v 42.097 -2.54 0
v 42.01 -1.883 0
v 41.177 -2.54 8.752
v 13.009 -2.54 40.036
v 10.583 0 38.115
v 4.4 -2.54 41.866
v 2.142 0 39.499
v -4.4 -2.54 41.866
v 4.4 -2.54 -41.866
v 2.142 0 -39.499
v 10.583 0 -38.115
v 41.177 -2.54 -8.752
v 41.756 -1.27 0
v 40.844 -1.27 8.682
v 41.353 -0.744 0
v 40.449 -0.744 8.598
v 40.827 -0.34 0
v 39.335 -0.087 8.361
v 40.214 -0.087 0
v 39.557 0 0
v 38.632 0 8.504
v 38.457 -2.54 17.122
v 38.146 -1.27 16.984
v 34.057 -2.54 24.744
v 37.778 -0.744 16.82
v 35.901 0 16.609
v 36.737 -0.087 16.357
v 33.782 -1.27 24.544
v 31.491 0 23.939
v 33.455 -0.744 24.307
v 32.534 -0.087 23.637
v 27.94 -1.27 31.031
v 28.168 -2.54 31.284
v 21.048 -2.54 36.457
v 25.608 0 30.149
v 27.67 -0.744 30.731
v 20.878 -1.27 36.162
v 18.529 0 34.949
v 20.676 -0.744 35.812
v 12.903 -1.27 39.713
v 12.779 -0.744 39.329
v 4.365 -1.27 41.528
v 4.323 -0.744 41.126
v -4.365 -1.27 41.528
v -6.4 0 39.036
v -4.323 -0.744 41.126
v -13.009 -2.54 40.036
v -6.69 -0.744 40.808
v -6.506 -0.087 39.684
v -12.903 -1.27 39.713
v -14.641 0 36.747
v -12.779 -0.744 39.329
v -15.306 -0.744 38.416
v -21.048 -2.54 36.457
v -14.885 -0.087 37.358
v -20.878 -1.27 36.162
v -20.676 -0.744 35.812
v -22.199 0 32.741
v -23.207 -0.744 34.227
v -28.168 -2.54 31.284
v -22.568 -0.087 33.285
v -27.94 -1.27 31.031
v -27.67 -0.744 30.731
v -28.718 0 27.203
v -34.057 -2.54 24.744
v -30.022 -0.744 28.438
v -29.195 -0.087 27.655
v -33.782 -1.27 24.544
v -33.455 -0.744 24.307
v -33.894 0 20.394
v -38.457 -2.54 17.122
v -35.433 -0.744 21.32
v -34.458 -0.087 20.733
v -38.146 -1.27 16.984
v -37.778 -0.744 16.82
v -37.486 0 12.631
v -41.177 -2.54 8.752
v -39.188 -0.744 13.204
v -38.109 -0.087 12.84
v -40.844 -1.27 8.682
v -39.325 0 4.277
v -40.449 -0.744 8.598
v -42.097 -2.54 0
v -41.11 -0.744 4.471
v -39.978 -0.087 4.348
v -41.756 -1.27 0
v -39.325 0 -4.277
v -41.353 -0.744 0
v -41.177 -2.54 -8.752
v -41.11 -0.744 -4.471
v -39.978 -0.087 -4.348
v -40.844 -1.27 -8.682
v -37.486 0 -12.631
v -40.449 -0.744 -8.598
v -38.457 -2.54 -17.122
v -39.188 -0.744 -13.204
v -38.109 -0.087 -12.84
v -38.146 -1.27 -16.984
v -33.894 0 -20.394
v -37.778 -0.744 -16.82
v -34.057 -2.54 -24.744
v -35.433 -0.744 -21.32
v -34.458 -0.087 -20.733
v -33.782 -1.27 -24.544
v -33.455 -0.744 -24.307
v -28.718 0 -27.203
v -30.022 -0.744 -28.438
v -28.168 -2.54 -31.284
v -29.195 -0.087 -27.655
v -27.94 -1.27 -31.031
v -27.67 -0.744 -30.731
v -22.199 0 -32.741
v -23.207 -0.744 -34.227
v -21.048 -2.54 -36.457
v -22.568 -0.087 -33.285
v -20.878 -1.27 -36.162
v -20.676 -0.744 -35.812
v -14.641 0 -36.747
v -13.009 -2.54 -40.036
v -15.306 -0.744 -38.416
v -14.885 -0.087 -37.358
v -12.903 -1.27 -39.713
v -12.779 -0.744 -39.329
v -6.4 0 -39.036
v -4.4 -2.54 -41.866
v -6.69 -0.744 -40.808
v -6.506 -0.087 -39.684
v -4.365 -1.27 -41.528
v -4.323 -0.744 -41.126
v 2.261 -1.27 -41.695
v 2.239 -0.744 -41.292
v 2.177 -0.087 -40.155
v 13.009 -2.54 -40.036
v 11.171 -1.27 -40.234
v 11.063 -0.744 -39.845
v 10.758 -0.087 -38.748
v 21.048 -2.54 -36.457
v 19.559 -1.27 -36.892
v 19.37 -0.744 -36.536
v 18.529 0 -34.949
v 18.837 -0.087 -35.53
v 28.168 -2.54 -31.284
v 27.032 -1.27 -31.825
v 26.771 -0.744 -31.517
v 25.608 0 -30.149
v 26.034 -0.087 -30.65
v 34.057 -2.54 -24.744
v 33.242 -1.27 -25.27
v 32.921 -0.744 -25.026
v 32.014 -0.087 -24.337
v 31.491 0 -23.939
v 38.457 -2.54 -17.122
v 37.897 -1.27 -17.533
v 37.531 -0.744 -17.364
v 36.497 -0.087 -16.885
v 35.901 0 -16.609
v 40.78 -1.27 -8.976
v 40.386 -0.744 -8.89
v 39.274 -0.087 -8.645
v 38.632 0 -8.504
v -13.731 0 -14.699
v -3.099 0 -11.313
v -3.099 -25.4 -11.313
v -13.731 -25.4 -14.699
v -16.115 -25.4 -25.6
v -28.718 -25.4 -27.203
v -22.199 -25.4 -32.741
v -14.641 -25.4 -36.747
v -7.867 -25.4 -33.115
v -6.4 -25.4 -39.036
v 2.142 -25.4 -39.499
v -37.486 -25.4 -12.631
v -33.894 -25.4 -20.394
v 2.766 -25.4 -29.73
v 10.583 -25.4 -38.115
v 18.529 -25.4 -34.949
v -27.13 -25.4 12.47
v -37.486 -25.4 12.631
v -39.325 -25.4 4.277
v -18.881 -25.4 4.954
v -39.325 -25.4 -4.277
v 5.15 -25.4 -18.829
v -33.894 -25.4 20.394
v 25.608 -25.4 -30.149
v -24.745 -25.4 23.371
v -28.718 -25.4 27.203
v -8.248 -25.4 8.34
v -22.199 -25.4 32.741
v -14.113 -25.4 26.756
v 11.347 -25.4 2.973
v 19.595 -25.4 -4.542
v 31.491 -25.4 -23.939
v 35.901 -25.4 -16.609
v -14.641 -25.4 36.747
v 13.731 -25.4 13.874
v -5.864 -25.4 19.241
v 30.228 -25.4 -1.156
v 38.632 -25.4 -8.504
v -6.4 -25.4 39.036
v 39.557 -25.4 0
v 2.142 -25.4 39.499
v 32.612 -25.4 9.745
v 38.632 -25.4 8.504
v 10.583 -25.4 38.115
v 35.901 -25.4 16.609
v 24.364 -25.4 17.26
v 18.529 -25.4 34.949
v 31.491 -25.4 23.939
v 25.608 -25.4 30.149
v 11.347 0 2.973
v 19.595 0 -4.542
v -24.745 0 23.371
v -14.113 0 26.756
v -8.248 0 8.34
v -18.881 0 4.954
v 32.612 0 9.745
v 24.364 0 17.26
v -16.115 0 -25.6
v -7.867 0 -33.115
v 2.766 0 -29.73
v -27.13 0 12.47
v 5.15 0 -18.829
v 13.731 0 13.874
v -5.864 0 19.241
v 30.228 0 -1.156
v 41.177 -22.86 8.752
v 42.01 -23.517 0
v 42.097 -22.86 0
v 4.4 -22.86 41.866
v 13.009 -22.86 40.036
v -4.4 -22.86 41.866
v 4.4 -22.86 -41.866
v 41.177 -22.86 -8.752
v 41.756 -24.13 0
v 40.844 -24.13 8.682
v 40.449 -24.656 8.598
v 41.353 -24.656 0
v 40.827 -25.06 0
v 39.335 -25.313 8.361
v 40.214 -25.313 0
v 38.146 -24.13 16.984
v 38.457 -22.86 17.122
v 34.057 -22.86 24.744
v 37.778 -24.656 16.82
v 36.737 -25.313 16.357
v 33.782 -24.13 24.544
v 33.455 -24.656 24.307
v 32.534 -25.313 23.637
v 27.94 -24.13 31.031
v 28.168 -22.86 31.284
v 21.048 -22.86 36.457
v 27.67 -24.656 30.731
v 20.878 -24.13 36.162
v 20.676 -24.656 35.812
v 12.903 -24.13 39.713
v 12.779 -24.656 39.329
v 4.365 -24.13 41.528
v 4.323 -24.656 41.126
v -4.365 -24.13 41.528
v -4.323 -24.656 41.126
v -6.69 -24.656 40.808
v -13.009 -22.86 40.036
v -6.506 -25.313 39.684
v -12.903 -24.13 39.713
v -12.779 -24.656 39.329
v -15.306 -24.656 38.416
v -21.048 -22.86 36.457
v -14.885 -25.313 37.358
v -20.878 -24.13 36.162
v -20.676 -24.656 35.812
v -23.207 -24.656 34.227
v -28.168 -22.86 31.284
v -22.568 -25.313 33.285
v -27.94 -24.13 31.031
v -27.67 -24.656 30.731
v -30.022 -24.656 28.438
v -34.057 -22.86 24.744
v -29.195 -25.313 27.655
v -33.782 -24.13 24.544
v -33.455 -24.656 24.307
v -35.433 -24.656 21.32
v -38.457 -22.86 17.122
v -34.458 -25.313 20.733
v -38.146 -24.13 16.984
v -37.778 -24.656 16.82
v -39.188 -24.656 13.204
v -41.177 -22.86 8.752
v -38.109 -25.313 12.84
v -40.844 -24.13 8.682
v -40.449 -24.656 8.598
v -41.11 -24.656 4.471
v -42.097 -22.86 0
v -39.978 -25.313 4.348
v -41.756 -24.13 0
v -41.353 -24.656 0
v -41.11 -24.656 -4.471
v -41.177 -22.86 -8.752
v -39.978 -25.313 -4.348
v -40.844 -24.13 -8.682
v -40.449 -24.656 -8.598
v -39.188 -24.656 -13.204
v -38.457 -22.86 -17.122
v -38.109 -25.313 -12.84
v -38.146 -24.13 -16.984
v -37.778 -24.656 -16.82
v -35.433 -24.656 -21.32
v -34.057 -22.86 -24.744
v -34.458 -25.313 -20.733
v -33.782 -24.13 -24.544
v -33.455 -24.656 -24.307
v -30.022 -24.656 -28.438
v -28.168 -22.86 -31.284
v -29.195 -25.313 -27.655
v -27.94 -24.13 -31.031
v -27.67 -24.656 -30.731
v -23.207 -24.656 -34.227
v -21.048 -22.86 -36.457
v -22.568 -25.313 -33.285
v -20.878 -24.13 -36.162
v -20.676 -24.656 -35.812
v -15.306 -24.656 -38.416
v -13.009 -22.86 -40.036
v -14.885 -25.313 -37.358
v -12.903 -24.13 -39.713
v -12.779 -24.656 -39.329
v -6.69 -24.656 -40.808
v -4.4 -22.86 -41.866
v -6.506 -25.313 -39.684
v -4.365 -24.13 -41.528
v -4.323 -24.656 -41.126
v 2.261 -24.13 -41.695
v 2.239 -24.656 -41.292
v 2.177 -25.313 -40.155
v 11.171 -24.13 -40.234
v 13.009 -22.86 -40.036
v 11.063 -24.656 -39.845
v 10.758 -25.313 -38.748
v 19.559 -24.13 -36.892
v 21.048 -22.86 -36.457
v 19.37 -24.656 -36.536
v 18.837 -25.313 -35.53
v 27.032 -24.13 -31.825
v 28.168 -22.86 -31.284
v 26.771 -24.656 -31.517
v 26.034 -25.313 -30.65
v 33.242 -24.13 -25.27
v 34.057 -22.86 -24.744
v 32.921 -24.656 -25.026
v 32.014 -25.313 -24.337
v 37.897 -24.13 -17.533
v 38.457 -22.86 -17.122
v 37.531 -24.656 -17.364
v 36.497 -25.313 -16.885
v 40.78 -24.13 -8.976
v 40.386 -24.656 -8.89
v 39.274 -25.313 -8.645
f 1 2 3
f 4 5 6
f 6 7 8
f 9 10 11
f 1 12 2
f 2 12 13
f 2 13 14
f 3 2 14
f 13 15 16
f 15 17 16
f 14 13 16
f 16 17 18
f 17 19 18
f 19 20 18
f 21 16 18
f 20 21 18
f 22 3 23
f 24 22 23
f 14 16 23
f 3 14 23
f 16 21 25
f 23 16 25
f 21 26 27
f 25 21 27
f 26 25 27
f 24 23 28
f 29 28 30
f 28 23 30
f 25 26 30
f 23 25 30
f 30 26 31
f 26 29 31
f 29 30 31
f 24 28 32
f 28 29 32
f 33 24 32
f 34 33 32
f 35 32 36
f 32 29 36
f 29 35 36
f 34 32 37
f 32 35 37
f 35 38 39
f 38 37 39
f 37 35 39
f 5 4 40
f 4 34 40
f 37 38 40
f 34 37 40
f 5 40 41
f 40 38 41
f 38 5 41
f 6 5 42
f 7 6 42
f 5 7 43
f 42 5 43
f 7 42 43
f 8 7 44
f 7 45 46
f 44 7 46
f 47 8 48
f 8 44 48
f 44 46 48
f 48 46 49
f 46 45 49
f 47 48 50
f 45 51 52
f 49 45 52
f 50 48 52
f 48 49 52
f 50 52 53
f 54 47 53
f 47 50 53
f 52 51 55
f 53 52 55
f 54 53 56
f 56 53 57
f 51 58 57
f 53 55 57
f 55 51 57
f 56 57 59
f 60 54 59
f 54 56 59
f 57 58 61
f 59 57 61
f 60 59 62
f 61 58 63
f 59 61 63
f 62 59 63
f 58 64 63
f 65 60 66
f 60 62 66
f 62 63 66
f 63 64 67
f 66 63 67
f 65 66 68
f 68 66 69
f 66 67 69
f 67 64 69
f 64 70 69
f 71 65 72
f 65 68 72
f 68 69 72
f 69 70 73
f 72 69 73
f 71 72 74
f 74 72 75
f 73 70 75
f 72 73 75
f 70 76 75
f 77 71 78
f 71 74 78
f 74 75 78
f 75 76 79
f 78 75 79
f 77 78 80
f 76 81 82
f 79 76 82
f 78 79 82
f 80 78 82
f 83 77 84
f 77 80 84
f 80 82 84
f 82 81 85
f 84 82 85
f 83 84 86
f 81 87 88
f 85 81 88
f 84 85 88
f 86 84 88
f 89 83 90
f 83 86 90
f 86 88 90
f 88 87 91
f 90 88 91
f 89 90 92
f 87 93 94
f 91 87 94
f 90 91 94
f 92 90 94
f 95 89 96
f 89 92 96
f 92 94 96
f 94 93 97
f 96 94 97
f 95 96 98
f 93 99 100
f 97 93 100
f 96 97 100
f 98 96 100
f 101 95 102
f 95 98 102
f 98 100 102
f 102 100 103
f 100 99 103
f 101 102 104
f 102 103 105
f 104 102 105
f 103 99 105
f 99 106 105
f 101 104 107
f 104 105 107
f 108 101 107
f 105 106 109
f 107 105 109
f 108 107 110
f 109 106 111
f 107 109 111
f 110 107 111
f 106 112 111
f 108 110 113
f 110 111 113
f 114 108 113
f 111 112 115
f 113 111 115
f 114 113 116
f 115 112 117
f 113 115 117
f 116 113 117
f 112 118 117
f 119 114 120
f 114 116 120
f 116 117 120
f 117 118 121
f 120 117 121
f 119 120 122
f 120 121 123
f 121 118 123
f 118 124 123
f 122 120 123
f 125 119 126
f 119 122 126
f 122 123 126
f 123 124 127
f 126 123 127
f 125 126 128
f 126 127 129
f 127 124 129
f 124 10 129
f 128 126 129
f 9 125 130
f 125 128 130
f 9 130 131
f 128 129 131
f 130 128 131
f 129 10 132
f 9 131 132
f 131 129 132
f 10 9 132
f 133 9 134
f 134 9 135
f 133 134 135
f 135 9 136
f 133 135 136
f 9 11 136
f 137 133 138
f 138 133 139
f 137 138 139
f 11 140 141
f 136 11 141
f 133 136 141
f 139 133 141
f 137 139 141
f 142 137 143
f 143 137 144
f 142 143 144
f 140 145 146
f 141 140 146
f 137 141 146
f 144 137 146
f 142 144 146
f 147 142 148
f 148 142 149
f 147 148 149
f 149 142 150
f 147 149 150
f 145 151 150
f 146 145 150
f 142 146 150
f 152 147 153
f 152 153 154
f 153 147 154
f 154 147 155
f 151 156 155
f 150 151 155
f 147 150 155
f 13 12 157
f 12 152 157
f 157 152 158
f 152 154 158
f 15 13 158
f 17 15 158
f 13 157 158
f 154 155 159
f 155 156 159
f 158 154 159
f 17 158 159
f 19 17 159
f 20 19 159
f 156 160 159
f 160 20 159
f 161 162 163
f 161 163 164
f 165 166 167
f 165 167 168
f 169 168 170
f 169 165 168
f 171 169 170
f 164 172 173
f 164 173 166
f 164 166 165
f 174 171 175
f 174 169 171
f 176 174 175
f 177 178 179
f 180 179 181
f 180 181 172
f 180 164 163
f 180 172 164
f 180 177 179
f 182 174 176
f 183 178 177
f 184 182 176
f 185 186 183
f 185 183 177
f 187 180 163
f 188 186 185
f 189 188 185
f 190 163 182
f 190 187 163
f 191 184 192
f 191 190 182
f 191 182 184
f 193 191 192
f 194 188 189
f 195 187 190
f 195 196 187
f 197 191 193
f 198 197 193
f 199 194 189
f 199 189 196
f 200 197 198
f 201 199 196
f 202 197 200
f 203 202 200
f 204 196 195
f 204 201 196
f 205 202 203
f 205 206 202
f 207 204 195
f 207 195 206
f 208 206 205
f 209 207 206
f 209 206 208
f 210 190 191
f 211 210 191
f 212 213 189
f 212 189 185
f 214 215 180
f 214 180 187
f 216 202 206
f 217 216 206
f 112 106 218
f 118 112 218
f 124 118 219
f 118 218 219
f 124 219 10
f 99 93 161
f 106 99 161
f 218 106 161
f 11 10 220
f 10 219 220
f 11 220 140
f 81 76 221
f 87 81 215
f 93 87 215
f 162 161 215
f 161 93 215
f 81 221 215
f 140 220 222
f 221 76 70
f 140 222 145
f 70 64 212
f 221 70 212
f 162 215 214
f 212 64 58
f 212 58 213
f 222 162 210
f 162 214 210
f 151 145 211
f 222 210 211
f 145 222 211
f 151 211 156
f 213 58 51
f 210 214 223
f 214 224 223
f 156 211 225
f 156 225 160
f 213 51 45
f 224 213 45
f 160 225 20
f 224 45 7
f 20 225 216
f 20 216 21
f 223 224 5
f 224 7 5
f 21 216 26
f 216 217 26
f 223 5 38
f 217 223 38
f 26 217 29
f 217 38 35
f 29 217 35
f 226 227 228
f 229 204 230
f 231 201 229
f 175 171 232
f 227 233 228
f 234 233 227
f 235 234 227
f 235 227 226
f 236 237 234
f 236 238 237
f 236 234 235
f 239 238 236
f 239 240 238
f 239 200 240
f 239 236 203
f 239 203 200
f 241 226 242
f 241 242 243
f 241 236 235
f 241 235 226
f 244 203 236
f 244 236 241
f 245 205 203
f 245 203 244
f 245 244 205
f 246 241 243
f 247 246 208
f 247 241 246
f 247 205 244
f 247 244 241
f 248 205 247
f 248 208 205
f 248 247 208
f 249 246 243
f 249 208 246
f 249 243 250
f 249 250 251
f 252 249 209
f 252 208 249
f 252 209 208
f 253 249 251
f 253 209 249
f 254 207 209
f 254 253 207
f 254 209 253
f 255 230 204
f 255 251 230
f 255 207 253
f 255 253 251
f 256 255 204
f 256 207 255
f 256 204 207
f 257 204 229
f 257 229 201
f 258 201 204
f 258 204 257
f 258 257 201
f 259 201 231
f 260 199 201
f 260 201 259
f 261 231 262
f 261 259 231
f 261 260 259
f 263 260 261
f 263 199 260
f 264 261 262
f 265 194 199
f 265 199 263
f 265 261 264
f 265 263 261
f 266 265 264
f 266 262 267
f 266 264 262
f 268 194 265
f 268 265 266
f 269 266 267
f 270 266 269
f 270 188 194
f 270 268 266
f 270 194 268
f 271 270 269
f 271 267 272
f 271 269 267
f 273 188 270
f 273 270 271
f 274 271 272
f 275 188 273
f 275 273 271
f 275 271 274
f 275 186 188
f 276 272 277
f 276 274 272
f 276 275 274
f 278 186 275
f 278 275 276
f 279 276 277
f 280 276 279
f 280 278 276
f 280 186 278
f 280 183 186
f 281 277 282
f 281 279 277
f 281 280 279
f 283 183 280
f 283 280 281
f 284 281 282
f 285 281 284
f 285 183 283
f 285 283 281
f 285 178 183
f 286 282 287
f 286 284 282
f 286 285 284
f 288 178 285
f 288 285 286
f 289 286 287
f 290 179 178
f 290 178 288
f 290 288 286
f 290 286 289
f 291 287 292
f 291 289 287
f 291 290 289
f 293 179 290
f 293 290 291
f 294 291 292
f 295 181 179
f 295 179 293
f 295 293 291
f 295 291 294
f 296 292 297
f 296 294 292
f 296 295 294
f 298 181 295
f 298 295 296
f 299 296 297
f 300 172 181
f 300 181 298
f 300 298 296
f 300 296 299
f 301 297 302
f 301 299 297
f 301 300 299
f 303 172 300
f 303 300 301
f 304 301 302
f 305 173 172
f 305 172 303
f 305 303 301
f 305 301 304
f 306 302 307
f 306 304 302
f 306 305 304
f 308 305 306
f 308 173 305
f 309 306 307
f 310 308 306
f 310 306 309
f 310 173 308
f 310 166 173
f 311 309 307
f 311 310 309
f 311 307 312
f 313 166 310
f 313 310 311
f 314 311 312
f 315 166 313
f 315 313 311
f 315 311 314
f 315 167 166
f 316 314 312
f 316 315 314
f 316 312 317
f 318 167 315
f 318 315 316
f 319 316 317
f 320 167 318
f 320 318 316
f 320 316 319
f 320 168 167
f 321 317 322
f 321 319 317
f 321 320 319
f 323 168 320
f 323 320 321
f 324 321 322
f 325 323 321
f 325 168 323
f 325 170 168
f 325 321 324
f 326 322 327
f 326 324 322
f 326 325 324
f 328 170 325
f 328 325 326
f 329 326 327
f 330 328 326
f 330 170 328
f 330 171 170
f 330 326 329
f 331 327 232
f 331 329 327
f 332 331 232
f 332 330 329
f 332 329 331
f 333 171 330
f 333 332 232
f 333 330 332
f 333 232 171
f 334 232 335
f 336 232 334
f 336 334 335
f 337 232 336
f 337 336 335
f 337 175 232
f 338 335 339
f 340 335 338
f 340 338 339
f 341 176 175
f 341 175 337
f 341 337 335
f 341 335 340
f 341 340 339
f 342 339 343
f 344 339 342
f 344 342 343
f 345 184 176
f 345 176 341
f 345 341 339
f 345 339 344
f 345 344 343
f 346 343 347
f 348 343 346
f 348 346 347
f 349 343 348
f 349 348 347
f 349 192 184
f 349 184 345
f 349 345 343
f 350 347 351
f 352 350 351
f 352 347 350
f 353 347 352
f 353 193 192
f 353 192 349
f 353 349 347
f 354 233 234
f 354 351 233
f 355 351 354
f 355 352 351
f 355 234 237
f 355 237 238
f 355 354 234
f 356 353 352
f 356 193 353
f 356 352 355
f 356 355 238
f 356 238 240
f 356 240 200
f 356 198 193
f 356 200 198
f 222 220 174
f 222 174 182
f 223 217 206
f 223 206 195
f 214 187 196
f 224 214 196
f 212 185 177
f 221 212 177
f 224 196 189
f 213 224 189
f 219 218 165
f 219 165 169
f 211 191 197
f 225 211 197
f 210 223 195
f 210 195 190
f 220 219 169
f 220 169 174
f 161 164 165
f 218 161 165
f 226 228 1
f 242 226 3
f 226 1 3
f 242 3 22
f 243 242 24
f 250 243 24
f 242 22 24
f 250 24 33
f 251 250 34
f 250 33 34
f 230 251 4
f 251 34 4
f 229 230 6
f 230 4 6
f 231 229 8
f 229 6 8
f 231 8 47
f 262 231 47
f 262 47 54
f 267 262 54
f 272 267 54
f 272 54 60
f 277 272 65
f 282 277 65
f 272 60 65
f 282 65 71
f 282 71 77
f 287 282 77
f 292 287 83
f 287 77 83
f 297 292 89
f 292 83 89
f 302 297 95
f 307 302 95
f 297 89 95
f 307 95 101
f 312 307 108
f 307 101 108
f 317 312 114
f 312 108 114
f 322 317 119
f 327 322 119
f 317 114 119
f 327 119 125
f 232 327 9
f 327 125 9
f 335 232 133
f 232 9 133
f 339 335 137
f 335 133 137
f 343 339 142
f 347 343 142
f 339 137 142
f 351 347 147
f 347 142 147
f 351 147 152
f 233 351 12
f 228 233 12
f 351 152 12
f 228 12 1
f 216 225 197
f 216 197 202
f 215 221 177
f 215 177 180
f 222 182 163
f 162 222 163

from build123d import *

# Parameters (mm, degrees)
F0_R            = 42.0966561171
F1_DEPTH        = 25.4
F3_DEPTH        = 25.401
F3_COPIES_COUNT = 3
F4_R            = 2.54
F5_R            = 2.54


# Not quite as in the source:
# - a pattern or mirror of a feature is missing from the dataset's text; its kind, count and spacing are read off the source's solid


with BuildPart() as f1:
    # F0 (on Front) → F1 (new body)
    with BuildSketch(Plane.XZ):
        Circle(F0_R)
    extrude(amount=F1_DEPTH)

    # F2 (on face) → F3 (cut, through all)
    with BuildSketch(Plane.XZ.offset(25.4)):
        Polygon((-18.881084953, 4.9543602206), (-8.2484530285, 8.3401026204), (-5.8642759952, 19.241103176), (-14.1127308863, 26.7563613318), (-24.7453628108, 23.3706189319), (-27.1295398441, 12.4696183764), align=None)
    f3 = extrude(amount=-F3_DEPTH, mode=Mode.SUBTRACT)

    # F3_copies: F3 ×3 about axis
    f3_copies_axis = Axis((0, 0, 0), (0, 1, 0))
    for i in range(1, F3_COPIES_COUNT):
        add(f3.rotate(f3_copies_axis, i * 360 / F3_COPIES_COUNT), mode=Mode.SUBTRACT)

    # F4
    f4_edges = [f1.edges().sort_by_distance(p)[0] for p in [
        (-42.096656, -25.4, 0),
    ]]
    fillet(f4_edges, radius=F4_R)

    # F5
    f5_edges = [f1.edges().sort_by_distance(p)[0] for p in [
        (-42.096656, 0, 0),
    ]]
    fillet(f5_edges, radius=F5_R)


solid = f1.part
